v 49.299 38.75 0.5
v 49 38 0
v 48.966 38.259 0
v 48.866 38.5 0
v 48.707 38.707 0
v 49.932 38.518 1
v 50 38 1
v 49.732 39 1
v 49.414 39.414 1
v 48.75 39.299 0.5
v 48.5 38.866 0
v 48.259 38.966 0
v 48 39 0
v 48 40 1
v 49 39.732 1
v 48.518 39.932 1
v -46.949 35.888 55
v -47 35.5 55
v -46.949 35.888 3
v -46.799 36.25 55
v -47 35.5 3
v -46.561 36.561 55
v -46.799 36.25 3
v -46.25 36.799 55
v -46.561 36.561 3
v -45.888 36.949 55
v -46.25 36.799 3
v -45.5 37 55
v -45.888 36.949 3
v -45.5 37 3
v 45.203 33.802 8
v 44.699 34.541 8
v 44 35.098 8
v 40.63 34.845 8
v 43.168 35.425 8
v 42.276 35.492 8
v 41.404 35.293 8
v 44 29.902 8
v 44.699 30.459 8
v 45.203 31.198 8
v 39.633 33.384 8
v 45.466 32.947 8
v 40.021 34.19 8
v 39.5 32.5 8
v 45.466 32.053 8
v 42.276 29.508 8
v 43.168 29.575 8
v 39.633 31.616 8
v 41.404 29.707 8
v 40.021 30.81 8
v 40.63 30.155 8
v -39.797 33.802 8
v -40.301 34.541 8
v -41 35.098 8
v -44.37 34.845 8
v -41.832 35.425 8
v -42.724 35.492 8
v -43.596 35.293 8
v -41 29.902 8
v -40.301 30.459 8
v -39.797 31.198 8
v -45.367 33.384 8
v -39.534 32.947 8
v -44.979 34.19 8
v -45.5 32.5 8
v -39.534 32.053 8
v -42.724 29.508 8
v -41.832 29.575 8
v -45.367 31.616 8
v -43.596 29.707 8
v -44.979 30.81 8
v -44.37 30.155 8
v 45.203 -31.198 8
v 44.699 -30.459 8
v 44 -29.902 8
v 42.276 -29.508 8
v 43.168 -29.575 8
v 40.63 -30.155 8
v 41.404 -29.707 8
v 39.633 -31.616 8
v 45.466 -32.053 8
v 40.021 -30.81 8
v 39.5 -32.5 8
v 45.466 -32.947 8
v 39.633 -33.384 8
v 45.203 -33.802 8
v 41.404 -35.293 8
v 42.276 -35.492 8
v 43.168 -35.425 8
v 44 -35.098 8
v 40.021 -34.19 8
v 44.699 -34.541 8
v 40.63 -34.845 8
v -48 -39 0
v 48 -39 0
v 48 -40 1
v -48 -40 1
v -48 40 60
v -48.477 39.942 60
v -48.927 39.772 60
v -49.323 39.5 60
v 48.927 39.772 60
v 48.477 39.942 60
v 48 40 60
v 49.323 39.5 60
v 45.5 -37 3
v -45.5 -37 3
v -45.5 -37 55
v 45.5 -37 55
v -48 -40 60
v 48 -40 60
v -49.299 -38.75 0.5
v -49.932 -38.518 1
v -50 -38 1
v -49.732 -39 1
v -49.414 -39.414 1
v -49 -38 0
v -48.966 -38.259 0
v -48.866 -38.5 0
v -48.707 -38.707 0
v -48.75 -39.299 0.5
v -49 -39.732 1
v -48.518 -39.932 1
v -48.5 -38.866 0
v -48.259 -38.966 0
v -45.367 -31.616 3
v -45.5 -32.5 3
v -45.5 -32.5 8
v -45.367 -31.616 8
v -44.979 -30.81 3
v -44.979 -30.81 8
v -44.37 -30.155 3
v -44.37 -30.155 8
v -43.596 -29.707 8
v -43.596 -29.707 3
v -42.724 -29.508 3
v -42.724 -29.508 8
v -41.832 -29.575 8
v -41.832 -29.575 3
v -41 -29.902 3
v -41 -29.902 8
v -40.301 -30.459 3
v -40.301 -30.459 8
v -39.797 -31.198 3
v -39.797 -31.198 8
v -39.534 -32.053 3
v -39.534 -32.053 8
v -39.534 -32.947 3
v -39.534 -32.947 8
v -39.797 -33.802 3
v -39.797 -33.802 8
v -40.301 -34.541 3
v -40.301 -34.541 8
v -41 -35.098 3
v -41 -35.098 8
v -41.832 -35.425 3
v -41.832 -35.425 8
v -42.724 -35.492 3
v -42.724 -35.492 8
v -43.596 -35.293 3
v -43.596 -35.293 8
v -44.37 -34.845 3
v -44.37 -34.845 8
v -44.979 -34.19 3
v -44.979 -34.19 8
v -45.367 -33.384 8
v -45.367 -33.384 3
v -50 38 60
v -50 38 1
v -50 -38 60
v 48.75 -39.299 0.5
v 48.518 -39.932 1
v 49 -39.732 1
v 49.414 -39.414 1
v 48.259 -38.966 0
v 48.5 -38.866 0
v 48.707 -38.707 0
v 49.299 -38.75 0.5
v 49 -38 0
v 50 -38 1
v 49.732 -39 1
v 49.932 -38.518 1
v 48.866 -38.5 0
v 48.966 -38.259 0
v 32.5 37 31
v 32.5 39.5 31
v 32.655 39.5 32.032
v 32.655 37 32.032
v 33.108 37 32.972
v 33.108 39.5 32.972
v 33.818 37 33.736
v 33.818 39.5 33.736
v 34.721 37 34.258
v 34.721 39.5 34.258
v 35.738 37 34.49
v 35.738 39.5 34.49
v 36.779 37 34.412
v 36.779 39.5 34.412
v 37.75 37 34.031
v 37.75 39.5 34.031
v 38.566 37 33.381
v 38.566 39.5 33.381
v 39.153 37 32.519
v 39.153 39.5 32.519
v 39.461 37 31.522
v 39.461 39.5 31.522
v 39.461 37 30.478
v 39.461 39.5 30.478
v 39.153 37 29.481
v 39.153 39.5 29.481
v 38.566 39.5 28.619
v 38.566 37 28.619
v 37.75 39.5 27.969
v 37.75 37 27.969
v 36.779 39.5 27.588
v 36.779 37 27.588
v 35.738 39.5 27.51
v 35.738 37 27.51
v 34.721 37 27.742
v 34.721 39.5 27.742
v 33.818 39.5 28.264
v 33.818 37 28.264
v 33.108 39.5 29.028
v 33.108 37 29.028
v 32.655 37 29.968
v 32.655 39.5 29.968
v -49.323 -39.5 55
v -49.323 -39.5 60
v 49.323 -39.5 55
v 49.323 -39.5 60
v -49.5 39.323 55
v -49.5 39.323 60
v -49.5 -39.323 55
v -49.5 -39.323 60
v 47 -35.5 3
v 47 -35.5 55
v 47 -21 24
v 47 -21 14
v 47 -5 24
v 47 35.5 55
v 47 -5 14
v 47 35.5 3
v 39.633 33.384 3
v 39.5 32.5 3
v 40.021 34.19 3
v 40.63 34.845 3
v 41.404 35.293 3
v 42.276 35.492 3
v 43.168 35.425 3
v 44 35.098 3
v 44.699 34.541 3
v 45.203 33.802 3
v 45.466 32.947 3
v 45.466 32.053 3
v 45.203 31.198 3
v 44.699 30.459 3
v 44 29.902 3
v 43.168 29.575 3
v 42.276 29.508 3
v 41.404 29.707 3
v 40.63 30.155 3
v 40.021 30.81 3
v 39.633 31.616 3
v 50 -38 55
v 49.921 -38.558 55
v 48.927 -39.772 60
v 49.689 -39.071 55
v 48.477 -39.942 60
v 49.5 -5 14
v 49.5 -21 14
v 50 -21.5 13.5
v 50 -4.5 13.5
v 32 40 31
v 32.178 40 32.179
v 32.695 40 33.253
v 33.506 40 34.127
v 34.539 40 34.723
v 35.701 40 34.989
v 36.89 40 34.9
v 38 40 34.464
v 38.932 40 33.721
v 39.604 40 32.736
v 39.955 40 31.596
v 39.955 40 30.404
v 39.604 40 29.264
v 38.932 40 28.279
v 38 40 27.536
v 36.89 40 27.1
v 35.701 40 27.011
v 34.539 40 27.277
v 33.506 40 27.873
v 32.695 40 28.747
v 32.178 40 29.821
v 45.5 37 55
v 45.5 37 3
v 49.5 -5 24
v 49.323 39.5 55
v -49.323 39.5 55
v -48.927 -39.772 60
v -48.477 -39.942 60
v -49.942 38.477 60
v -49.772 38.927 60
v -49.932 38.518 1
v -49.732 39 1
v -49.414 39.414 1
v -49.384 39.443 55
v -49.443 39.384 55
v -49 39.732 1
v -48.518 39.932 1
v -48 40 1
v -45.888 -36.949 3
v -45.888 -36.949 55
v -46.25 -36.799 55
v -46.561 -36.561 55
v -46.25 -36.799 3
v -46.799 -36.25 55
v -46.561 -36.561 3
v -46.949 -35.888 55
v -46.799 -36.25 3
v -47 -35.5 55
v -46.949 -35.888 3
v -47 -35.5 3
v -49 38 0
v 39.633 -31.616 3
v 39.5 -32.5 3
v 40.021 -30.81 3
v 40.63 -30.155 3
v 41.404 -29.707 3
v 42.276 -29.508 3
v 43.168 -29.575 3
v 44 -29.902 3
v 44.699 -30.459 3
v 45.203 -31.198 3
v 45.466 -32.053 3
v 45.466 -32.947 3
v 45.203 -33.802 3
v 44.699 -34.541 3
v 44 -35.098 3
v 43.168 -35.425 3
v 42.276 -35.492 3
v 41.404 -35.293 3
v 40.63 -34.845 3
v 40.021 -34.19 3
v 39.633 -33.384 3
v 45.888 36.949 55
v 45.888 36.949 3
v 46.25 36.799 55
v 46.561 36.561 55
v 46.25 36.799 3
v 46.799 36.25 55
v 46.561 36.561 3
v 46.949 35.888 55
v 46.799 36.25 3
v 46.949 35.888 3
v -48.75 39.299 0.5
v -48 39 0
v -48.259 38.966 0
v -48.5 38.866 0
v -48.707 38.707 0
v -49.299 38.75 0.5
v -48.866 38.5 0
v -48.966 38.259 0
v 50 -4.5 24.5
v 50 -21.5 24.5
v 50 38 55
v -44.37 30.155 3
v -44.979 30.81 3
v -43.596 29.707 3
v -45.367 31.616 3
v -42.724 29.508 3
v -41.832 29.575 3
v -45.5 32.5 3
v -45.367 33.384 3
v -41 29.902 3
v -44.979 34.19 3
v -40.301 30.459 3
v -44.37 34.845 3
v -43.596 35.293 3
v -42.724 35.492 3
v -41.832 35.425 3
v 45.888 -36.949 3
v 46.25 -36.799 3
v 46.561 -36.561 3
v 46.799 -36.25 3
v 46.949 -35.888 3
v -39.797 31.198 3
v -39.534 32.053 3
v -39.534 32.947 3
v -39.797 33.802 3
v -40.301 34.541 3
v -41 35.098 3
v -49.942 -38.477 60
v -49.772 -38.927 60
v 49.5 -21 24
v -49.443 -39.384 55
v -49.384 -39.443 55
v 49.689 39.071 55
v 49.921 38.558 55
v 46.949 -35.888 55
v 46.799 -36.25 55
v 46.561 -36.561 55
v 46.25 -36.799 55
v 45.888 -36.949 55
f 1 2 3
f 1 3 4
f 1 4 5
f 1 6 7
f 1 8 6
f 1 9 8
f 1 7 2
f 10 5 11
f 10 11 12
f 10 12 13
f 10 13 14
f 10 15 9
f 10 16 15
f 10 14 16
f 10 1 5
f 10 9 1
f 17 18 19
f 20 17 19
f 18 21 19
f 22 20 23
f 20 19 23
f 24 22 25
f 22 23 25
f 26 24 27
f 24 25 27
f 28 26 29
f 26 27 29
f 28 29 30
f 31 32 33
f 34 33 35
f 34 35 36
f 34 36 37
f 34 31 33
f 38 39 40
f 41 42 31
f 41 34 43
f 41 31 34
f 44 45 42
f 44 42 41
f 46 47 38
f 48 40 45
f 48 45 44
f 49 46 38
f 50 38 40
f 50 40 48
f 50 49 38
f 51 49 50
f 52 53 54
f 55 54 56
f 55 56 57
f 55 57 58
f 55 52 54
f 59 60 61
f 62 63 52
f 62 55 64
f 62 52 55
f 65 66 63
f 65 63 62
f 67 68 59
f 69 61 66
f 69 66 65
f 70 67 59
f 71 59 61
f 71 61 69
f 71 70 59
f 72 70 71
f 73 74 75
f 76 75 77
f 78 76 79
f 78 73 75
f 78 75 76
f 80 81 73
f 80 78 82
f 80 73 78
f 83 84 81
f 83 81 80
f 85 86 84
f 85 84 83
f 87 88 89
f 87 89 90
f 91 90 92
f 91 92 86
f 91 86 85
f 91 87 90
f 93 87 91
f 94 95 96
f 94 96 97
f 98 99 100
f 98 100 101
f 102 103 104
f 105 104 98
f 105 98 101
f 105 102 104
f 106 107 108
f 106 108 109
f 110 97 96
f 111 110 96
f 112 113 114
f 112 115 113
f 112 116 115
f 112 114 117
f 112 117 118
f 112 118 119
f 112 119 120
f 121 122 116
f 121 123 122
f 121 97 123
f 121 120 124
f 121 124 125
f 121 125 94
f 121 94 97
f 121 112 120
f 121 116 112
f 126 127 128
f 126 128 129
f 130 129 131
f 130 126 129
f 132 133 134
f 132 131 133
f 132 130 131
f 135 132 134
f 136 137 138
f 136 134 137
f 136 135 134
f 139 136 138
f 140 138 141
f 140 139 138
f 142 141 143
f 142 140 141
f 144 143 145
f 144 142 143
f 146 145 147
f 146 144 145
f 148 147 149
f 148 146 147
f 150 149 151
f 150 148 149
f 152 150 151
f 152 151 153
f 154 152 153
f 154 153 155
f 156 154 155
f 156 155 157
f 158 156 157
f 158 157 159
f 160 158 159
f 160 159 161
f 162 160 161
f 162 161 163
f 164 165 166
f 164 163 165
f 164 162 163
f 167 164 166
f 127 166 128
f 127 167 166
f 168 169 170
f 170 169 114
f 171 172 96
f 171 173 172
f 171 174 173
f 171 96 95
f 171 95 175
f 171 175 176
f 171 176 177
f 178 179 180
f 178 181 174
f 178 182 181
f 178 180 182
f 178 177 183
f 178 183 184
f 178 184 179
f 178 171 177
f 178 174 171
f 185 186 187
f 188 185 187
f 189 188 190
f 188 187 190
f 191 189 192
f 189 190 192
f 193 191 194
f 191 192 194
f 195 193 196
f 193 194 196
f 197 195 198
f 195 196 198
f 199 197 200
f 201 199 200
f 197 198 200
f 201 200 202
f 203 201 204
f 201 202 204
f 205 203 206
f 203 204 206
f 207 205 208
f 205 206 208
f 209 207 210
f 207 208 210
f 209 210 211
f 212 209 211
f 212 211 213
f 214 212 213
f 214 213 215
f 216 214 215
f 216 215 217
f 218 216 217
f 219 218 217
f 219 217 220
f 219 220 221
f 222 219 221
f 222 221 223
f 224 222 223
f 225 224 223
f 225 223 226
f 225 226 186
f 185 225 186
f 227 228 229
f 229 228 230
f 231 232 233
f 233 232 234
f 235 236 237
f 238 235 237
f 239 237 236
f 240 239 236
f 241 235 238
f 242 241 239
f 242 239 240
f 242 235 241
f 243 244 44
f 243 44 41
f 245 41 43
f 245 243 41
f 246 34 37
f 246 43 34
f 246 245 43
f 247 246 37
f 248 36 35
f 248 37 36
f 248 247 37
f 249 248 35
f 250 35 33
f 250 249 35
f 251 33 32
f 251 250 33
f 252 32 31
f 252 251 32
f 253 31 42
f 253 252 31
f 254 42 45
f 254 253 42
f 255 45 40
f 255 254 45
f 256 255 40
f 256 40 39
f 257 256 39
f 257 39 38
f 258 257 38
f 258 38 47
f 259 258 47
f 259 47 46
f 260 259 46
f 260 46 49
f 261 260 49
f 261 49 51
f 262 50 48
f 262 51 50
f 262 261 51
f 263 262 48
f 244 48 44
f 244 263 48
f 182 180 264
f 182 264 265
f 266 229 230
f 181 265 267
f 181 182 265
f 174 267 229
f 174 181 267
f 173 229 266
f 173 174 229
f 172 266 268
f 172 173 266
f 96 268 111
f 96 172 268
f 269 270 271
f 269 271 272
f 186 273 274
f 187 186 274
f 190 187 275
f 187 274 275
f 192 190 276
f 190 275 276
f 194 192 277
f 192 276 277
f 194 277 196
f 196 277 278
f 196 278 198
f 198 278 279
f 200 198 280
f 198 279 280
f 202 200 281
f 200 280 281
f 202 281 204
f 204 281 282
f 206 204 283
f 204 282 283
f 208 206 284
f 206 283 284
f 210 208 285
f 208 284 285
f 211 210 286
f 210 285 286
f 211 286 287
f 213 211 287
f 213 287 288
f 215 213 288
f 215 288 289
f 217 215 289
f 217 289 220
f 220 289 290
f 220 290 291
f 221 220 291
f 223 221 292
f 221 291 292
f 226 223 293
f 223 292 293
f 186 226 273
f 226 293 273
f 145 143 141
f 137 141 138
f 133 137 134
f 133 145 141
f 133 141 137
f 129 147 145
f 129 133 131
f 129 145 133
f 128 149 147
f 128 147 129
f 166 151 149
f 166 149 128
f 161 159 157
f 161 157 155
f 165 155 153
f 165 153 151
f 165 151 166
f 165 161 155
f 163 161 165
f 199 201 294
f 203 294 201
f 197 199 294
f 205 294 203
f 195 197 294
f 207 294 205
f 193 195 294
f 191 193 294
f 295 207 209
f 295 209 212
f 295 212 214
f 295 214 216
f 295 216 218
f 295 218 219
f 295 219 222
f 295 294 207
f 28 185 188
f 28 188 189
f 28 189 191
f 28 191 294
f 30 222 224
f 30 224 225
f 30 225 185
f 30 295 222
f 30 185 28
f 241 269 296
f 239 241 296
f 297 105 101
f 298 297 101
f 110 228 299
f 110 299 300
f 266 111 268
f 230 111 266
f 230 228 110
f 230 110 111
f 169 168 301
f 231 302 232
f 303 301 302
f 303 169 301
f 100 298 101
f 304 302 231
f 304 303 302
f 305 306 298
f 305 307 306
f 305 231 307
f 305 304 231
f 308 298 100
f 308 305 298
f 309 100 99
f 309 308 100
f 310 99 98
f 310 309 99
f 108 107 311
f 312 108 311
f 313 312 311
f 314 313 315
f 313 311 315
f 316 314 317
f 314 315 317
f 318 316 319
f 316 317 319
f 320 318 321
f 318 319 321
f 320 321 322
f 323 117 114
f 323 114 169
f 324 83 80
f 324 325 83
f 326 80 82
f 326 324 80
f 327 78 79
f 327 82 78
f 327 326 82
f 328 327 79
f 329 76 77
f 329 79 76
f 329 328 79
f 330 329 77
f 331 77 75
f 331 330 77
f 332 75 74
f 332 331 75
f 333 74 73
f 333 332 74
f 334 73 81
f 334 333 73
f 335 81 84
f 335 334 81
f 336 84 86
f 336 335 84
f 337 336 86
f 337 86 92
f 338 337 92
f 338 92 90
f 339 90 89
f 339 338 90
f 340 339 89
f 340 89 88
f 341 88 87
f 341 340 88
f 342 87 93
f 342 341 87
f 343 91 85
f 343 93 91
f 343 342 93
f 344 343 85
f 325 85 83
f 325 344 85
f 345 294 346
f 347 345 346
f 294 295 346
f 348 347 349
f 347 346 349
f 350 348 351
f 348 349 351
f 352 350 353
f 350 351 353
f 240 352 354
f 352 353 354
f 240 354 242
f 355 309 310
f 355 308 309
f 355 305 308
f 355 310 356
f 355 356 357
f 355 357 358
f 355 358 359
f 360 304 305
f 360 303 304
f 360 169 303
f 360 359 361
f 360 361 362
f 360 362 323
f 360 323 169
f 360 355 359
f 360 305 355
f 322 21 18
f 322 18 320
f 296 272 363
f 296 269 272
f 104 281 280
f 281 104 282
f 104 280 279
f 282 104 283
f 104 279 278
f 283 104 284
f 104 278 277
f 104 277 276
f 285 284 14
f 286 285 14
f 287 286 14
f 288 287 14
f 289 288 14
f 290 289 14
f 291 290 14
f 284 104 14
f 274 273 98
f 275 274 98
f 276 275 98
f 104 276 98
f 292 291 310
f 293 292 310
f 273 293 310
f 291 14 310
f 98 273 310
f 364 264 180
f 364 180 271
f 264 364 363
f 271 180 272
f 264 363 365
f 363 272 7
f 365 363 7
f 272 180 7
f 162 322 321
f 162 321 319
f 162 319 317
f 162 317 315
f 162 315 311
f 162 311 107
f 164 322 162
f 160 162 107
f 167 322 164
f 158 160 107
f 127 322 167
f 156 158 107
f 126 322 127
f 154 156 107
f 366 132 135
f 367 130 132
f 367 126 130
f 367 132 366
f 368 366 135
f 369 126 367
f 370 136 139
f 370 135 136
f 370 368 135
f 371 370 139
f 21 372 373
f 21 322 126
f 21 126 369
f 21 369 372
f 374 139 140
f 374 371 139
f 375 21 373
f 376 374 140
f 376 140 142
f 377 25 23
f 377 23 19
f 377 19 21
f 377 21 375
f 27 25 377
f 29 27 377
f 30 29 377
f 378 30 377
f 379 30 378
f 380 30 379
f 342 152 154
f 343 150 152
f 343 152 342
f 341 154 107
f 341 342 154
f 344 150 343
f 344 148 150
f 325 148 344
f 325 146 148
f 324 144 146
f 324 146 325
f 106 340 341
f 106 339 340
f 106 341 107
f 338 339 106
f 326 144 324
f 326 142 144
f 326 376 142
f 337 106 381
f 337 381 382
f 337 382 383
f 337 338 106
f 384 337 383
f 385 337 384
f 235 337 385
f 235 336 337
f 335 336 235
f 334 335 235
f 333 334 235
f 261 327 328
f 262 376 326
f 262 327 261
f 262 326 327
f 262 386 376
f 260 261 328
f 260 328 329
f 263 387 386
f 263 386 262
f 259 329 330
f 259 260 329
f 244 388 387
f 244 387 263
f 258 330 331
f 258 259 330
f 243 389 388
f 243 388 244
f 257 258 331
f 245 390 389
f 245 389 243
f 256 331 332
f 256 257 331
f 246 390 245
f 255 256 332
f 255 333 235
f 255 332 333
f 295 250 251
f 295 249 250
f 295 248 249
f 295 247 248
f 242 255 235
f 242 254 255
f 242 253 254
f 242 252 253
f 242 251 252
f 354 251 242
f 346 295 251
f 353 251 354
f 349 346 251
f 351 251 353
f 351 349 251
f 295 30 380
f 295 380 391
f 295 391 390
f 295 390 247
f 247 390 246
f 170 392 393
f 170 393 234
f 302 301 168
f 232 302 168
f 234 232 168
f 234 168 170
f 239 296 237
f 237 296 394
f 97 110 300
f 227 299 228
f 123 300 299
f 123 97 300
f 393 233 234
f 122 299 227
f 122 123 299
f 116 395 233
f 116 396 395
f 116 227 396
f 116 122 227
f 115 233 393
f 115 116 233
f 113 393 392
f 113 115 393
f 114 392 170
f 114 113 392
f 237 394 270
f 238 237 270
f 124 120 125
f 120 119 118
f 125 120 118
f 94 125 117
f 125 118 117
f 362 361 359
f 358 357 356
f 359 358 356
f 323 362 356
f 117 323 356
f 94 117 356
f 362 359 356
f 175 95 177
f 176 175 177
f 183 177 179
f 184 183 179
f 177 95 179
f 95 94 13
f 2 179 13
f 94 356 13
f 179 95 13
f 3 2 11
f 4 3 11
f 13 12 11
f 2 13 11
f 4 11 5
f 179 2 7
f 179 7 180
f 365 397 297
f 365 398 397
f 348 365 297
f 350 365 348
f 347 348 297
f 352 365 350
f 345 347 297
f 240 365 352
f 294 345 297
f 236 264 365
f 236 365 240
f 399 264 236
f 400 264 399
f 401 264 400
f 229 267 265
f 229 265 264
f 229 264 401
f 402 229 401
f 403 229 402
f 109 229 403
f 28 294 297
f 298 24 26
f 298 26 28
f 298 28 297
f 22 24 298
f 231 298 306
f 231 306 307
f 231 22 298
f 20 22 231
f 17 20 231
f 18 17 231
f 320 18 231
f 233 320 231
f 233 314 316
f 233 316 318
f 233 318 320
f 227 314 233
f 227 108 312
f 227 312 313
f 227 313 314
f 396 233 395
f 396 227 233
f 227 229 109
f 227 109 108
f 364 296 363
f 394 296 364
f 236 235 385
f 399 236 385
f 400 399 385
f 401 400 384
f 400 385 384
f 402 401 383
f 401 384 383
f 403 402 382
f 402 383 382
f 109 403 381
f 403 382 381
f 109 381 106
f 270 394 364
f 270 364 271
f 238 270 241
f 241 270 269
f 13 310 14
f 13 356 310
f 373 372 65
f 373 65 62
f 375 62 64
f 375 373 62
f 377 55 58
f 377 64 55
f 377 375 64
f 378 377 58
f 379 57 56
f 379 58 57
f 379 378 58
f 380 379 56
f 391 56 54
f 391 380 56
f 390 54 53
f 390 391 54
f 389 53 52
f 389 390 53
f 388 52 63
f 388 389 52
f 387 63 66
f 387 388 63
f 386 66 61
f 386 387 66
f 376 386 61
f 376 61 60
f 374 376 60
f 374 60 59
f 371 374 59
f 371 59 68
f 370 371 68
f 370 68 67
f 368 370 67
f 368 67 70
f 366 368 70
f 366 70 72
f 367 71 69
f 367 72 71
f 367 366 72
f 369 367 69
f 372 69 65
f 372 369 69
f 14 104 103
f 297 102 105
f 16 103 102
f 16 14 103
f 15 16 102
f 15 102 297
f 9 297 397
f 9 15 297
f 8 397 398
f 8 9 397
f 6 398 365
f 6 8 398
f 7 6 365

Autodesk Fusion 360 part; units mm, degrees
sketch "Sketch1" plane through (0, 0, 0) normal (0, 0, 1) x (1, 0, 0)
  line L0 (48, 40) -> (-48, 40)
  line L1 (-50, 38) -> (-50, -38)
  line L2 (-48, -40) -> (48, -40)
  line L3 (50, -38) -> (50, 38)
  line L4 (50, 40) -> (-50, -40) construction
  line L5 (-50, 40) -> (50, -40) construction
  line L6 (45.5, 37) -> (-45.5, 37)
  line L7 (-47, 35.5) -> (-47, -35.5)
  line L8 (-45.5, -37) -> (45.5, -37)
  line L9 (47, -35.5) -> (47, 35.5)
  line L10 (47, 37) -> (-47, -37) construction
  line L11 (-47, 37) -> (47, -37) construction
  arc A0 (-48, 40) -> (-50, 38) centre (-48, 38) ccw
  arc A1 (50, 38) -> (48, 40) centre (48, 38) ccw
  arc A2 (48, -40) -> (50, -38) centre (48, -38) ccw
  arc A3 (-50, -38) -> (-48, -40) centre (-48, -38) ccw
  arc A4 (-45.5, 37) -> (-47, 35.5) centre (-45.5, 35.5) ccw
  arc A5 (47, 35.5) -> (45.5, 37) centre (45.5, 35.5) ccw
  arc A6 (45.5, -37) -> (47, -35.5) centre (45.5, -35.5) ccw
  arc A7 (-47, -35.5) -> (-45.5, -37) centre (-45.5, -35.5) ccw
  dimension "d1" = 100
  dimension "d2" = 80
  dimension "d3" = 94
  dimension "d4" = 74
  dimension "d5" = 2
  dimension "d6" = 1.5
extrude "Extrude1" add sketch "Sketch1" along normal blind 55
extrude "Extrude2" add sketch "Sketch1" along normal blind 3 contours L6 L7 L8 L9 A4 A5 A6 A7
chamfer "Chamfer1" distance 1 angle 45 8 edges at (50, 0, 0) (49.4142, 39.4142, 0) (0, 40, 0) (-49.4142, 39.4142, 0) (-50, 0, 0) (-49.4142, -39.4142, 0) (0, -40, 0) (49.4142, -39.4142, 0)
sketch "Sketch2" plane through (0, 0, 3) normal (0, 0, 1) x (-1, 0, 0)
  arc A0 (47, 35.5) -> (45.5, 37) centre (45.5, 35.5) ccw
  line L0 (45.5, 37) -> (-45.5, 37)
  arc A1 (-45.5, 37) -> (-47, 35.5) centre (-45.5, 35.5) ccw
  line L1 (-47, 35.5) -> (-47, -35.5)
  arc A2 (-47, -35.5) -> (-45.5, -37) centre (-45.5, -35.5) ccw
  line L2 (-45.5, -37) -> (45.5, -37)
  arc A3 (45.5, -37) -> (47, -35.5) centre (45.5, -35.5) ccw
  line L3 (47, -35.5) -> (47, 35.5)
  circle A4 centre (42.5, -32.5) radius 3
  line L4 (50, 0) -> (-50, 0) construction
  line L5 (0, -40) -> (0, 40) construction
  circle A5 centre (42.5, 32.5) radius 3
  circle A6 centre (-42.5, -32.5) radius 3
  circle A7 centre (-42.5, 32.5) radius 3
  dimension "d12" = 6
  dimension "d13" = 4.5
  dimension "d14" = 4.5
extrude "Extrude3" add sketch "Sketch2" along normal blind 5 contours A4 | A5 | A6 | A7
sketch "Sketch3" plane through (50, 0, 0) normal (1, 0, 0) x (0, 1, 0)
  line L0 (-38, 1) -> (38, 1)
  line L1 (38, 1) -> (38, 55)
  line L2 (38, 55) -> (-38, 55)
  line L3 (-38, 55) -> (-38, 1)
  line L4 (-5, 24) -> (-21, 24)
  line L5 (-21, 24) -> (-21, 14)
  line L6 (-21, 14) -> (-5, 14)
  line L7 (-5, 14) -> (-5, 24)
  line L8 (-5, 24) -> (-21, 14) construction
  line L9 (-21, 24) -> (-5, 14) construction
  point P0 (-13, 19)
  dimension "d17" = 16
  dimension "d18" = 10
  dimension "d19" = 25
  dimension "d20" = 18
extrude "Extrude4" cut sketch "Sketch3" against normal blind 3 contours L4 L5 L6 L7
sketch "Sketch4" plane through (0, 40, 0) normal (0, 1, 0) x (-1, 0, 0)
  line L0 (-48, 1) -> (48, 1)
  line L1 (48, 1) -> (48, 55)
  line L2 (48, 55) -> (-48, 55)
  line L3 (-48, 55) -> (-48, 1)
  circle A0 centre (-36, 31) radius 3.5
  dimension "d23" = 7
  dimension "d24" = 12
  dimension "d25" = 30
extrude "Extrude5" cut sketch "Sketch4" against normal blind 3 contours A0
extrude "Extrude6" add 1 faces at (-15.1667, 39, 55) along direction (0, 0, 1) blind 5
sketch "Sketch5" plane through (0, 0, 60) normal (0, 0, 1) x (-1, 0, 0)
  arc A0 (47, 35.5) -> (45.5, 37) centre (45.5, 35.5) ccw
  line L0 (47, 35.5) -> (47, -35.5)
  arc A1 (45.5, -37) -> (47, -35.5) centre (45.5, -35.5) ccw
  line L1 (45.5, -37) -> (-45.5, -37)
  arc A2 (-47, -35.5) -> (-45.5, -37) centre (-45.5, -35.5) ccw
  line L2 (-47, -35.5) -> (-47, 35.5)
  arc A3 (-45.5, 37) -> (-47, 35.5) centre (-45.5, 35.5) ccw
  line L3 (-45.5, 37) -> (45.5, 37)
  arc A4 (50, 38) -> (48, 40) centre (48, 38) ccw
  line L4 (48, 40) -> (-48, 40)
  arc A5 (-48, 40) -> (-50, 38) centre (-48, 38) ccw
  line L5 (-50, 38) -> (-50, -38)
  arc A6 (-50, -38) -> (-48, -40) centre (-48, -38) ccw
  line L6 (-48, -40) -> (48, -40)
  arc A7 (48, -40) -> (50, -38) centre (48, -38) ccw
  line L7 (50, -38) -> (50, 38)
  line L8 (49.5, 39.5) -> (-49.5, 39.5)
  line L9 (-49.5, 39.5) -> (-49.5, -39.5)
  line L10 (-49.5, -39.5) -> (49.5, -39.5)
  line L11 (49.5, -39.5) -> (49.5, 39.5)
  line L12 (46.3, 36.3) -> (-46.3, 36.3)
  line L13 (-46.3, 36.3) -> (-46.3, -36.3)
  line L14 (-46.3, -36.3) -> (46.3, -36.3)
  line L15 (46.3, -36.3) -> (46.3, 36.3)
  dimension "d30" = 0.5
  dimension "d31" = 0.5
  dimension "d32" = 0.5
  dimension "d33" = 0.5
  dimension "d34" = 3.2
  dimension "d35" = 3.2
  dimension "d36" = 3.2
  dimension "d37" = 3.2
extrude "Extrude7" cut sketch "Sketch5" against normal blind 5 contours A0 L0 A1 L1 A2 L2 A3 L3 | A4 A5 A6 A7 L8 L9 L10 L11
extrude "Extrude8" cut 1 faces at (49.6667, 12.6667, 60) along direction (0, 0, -1) blind 5
chamfer "Chamfer2" distance 0.5 angle 45 4 edges at (50, -5, 19) (50, -13, 24) (50, -21, 19) (50, -13, 14)
chamfer "Chamfer3" distance 0.5 angle 45 1 edges at (39.2631, 40, 32.2657)
